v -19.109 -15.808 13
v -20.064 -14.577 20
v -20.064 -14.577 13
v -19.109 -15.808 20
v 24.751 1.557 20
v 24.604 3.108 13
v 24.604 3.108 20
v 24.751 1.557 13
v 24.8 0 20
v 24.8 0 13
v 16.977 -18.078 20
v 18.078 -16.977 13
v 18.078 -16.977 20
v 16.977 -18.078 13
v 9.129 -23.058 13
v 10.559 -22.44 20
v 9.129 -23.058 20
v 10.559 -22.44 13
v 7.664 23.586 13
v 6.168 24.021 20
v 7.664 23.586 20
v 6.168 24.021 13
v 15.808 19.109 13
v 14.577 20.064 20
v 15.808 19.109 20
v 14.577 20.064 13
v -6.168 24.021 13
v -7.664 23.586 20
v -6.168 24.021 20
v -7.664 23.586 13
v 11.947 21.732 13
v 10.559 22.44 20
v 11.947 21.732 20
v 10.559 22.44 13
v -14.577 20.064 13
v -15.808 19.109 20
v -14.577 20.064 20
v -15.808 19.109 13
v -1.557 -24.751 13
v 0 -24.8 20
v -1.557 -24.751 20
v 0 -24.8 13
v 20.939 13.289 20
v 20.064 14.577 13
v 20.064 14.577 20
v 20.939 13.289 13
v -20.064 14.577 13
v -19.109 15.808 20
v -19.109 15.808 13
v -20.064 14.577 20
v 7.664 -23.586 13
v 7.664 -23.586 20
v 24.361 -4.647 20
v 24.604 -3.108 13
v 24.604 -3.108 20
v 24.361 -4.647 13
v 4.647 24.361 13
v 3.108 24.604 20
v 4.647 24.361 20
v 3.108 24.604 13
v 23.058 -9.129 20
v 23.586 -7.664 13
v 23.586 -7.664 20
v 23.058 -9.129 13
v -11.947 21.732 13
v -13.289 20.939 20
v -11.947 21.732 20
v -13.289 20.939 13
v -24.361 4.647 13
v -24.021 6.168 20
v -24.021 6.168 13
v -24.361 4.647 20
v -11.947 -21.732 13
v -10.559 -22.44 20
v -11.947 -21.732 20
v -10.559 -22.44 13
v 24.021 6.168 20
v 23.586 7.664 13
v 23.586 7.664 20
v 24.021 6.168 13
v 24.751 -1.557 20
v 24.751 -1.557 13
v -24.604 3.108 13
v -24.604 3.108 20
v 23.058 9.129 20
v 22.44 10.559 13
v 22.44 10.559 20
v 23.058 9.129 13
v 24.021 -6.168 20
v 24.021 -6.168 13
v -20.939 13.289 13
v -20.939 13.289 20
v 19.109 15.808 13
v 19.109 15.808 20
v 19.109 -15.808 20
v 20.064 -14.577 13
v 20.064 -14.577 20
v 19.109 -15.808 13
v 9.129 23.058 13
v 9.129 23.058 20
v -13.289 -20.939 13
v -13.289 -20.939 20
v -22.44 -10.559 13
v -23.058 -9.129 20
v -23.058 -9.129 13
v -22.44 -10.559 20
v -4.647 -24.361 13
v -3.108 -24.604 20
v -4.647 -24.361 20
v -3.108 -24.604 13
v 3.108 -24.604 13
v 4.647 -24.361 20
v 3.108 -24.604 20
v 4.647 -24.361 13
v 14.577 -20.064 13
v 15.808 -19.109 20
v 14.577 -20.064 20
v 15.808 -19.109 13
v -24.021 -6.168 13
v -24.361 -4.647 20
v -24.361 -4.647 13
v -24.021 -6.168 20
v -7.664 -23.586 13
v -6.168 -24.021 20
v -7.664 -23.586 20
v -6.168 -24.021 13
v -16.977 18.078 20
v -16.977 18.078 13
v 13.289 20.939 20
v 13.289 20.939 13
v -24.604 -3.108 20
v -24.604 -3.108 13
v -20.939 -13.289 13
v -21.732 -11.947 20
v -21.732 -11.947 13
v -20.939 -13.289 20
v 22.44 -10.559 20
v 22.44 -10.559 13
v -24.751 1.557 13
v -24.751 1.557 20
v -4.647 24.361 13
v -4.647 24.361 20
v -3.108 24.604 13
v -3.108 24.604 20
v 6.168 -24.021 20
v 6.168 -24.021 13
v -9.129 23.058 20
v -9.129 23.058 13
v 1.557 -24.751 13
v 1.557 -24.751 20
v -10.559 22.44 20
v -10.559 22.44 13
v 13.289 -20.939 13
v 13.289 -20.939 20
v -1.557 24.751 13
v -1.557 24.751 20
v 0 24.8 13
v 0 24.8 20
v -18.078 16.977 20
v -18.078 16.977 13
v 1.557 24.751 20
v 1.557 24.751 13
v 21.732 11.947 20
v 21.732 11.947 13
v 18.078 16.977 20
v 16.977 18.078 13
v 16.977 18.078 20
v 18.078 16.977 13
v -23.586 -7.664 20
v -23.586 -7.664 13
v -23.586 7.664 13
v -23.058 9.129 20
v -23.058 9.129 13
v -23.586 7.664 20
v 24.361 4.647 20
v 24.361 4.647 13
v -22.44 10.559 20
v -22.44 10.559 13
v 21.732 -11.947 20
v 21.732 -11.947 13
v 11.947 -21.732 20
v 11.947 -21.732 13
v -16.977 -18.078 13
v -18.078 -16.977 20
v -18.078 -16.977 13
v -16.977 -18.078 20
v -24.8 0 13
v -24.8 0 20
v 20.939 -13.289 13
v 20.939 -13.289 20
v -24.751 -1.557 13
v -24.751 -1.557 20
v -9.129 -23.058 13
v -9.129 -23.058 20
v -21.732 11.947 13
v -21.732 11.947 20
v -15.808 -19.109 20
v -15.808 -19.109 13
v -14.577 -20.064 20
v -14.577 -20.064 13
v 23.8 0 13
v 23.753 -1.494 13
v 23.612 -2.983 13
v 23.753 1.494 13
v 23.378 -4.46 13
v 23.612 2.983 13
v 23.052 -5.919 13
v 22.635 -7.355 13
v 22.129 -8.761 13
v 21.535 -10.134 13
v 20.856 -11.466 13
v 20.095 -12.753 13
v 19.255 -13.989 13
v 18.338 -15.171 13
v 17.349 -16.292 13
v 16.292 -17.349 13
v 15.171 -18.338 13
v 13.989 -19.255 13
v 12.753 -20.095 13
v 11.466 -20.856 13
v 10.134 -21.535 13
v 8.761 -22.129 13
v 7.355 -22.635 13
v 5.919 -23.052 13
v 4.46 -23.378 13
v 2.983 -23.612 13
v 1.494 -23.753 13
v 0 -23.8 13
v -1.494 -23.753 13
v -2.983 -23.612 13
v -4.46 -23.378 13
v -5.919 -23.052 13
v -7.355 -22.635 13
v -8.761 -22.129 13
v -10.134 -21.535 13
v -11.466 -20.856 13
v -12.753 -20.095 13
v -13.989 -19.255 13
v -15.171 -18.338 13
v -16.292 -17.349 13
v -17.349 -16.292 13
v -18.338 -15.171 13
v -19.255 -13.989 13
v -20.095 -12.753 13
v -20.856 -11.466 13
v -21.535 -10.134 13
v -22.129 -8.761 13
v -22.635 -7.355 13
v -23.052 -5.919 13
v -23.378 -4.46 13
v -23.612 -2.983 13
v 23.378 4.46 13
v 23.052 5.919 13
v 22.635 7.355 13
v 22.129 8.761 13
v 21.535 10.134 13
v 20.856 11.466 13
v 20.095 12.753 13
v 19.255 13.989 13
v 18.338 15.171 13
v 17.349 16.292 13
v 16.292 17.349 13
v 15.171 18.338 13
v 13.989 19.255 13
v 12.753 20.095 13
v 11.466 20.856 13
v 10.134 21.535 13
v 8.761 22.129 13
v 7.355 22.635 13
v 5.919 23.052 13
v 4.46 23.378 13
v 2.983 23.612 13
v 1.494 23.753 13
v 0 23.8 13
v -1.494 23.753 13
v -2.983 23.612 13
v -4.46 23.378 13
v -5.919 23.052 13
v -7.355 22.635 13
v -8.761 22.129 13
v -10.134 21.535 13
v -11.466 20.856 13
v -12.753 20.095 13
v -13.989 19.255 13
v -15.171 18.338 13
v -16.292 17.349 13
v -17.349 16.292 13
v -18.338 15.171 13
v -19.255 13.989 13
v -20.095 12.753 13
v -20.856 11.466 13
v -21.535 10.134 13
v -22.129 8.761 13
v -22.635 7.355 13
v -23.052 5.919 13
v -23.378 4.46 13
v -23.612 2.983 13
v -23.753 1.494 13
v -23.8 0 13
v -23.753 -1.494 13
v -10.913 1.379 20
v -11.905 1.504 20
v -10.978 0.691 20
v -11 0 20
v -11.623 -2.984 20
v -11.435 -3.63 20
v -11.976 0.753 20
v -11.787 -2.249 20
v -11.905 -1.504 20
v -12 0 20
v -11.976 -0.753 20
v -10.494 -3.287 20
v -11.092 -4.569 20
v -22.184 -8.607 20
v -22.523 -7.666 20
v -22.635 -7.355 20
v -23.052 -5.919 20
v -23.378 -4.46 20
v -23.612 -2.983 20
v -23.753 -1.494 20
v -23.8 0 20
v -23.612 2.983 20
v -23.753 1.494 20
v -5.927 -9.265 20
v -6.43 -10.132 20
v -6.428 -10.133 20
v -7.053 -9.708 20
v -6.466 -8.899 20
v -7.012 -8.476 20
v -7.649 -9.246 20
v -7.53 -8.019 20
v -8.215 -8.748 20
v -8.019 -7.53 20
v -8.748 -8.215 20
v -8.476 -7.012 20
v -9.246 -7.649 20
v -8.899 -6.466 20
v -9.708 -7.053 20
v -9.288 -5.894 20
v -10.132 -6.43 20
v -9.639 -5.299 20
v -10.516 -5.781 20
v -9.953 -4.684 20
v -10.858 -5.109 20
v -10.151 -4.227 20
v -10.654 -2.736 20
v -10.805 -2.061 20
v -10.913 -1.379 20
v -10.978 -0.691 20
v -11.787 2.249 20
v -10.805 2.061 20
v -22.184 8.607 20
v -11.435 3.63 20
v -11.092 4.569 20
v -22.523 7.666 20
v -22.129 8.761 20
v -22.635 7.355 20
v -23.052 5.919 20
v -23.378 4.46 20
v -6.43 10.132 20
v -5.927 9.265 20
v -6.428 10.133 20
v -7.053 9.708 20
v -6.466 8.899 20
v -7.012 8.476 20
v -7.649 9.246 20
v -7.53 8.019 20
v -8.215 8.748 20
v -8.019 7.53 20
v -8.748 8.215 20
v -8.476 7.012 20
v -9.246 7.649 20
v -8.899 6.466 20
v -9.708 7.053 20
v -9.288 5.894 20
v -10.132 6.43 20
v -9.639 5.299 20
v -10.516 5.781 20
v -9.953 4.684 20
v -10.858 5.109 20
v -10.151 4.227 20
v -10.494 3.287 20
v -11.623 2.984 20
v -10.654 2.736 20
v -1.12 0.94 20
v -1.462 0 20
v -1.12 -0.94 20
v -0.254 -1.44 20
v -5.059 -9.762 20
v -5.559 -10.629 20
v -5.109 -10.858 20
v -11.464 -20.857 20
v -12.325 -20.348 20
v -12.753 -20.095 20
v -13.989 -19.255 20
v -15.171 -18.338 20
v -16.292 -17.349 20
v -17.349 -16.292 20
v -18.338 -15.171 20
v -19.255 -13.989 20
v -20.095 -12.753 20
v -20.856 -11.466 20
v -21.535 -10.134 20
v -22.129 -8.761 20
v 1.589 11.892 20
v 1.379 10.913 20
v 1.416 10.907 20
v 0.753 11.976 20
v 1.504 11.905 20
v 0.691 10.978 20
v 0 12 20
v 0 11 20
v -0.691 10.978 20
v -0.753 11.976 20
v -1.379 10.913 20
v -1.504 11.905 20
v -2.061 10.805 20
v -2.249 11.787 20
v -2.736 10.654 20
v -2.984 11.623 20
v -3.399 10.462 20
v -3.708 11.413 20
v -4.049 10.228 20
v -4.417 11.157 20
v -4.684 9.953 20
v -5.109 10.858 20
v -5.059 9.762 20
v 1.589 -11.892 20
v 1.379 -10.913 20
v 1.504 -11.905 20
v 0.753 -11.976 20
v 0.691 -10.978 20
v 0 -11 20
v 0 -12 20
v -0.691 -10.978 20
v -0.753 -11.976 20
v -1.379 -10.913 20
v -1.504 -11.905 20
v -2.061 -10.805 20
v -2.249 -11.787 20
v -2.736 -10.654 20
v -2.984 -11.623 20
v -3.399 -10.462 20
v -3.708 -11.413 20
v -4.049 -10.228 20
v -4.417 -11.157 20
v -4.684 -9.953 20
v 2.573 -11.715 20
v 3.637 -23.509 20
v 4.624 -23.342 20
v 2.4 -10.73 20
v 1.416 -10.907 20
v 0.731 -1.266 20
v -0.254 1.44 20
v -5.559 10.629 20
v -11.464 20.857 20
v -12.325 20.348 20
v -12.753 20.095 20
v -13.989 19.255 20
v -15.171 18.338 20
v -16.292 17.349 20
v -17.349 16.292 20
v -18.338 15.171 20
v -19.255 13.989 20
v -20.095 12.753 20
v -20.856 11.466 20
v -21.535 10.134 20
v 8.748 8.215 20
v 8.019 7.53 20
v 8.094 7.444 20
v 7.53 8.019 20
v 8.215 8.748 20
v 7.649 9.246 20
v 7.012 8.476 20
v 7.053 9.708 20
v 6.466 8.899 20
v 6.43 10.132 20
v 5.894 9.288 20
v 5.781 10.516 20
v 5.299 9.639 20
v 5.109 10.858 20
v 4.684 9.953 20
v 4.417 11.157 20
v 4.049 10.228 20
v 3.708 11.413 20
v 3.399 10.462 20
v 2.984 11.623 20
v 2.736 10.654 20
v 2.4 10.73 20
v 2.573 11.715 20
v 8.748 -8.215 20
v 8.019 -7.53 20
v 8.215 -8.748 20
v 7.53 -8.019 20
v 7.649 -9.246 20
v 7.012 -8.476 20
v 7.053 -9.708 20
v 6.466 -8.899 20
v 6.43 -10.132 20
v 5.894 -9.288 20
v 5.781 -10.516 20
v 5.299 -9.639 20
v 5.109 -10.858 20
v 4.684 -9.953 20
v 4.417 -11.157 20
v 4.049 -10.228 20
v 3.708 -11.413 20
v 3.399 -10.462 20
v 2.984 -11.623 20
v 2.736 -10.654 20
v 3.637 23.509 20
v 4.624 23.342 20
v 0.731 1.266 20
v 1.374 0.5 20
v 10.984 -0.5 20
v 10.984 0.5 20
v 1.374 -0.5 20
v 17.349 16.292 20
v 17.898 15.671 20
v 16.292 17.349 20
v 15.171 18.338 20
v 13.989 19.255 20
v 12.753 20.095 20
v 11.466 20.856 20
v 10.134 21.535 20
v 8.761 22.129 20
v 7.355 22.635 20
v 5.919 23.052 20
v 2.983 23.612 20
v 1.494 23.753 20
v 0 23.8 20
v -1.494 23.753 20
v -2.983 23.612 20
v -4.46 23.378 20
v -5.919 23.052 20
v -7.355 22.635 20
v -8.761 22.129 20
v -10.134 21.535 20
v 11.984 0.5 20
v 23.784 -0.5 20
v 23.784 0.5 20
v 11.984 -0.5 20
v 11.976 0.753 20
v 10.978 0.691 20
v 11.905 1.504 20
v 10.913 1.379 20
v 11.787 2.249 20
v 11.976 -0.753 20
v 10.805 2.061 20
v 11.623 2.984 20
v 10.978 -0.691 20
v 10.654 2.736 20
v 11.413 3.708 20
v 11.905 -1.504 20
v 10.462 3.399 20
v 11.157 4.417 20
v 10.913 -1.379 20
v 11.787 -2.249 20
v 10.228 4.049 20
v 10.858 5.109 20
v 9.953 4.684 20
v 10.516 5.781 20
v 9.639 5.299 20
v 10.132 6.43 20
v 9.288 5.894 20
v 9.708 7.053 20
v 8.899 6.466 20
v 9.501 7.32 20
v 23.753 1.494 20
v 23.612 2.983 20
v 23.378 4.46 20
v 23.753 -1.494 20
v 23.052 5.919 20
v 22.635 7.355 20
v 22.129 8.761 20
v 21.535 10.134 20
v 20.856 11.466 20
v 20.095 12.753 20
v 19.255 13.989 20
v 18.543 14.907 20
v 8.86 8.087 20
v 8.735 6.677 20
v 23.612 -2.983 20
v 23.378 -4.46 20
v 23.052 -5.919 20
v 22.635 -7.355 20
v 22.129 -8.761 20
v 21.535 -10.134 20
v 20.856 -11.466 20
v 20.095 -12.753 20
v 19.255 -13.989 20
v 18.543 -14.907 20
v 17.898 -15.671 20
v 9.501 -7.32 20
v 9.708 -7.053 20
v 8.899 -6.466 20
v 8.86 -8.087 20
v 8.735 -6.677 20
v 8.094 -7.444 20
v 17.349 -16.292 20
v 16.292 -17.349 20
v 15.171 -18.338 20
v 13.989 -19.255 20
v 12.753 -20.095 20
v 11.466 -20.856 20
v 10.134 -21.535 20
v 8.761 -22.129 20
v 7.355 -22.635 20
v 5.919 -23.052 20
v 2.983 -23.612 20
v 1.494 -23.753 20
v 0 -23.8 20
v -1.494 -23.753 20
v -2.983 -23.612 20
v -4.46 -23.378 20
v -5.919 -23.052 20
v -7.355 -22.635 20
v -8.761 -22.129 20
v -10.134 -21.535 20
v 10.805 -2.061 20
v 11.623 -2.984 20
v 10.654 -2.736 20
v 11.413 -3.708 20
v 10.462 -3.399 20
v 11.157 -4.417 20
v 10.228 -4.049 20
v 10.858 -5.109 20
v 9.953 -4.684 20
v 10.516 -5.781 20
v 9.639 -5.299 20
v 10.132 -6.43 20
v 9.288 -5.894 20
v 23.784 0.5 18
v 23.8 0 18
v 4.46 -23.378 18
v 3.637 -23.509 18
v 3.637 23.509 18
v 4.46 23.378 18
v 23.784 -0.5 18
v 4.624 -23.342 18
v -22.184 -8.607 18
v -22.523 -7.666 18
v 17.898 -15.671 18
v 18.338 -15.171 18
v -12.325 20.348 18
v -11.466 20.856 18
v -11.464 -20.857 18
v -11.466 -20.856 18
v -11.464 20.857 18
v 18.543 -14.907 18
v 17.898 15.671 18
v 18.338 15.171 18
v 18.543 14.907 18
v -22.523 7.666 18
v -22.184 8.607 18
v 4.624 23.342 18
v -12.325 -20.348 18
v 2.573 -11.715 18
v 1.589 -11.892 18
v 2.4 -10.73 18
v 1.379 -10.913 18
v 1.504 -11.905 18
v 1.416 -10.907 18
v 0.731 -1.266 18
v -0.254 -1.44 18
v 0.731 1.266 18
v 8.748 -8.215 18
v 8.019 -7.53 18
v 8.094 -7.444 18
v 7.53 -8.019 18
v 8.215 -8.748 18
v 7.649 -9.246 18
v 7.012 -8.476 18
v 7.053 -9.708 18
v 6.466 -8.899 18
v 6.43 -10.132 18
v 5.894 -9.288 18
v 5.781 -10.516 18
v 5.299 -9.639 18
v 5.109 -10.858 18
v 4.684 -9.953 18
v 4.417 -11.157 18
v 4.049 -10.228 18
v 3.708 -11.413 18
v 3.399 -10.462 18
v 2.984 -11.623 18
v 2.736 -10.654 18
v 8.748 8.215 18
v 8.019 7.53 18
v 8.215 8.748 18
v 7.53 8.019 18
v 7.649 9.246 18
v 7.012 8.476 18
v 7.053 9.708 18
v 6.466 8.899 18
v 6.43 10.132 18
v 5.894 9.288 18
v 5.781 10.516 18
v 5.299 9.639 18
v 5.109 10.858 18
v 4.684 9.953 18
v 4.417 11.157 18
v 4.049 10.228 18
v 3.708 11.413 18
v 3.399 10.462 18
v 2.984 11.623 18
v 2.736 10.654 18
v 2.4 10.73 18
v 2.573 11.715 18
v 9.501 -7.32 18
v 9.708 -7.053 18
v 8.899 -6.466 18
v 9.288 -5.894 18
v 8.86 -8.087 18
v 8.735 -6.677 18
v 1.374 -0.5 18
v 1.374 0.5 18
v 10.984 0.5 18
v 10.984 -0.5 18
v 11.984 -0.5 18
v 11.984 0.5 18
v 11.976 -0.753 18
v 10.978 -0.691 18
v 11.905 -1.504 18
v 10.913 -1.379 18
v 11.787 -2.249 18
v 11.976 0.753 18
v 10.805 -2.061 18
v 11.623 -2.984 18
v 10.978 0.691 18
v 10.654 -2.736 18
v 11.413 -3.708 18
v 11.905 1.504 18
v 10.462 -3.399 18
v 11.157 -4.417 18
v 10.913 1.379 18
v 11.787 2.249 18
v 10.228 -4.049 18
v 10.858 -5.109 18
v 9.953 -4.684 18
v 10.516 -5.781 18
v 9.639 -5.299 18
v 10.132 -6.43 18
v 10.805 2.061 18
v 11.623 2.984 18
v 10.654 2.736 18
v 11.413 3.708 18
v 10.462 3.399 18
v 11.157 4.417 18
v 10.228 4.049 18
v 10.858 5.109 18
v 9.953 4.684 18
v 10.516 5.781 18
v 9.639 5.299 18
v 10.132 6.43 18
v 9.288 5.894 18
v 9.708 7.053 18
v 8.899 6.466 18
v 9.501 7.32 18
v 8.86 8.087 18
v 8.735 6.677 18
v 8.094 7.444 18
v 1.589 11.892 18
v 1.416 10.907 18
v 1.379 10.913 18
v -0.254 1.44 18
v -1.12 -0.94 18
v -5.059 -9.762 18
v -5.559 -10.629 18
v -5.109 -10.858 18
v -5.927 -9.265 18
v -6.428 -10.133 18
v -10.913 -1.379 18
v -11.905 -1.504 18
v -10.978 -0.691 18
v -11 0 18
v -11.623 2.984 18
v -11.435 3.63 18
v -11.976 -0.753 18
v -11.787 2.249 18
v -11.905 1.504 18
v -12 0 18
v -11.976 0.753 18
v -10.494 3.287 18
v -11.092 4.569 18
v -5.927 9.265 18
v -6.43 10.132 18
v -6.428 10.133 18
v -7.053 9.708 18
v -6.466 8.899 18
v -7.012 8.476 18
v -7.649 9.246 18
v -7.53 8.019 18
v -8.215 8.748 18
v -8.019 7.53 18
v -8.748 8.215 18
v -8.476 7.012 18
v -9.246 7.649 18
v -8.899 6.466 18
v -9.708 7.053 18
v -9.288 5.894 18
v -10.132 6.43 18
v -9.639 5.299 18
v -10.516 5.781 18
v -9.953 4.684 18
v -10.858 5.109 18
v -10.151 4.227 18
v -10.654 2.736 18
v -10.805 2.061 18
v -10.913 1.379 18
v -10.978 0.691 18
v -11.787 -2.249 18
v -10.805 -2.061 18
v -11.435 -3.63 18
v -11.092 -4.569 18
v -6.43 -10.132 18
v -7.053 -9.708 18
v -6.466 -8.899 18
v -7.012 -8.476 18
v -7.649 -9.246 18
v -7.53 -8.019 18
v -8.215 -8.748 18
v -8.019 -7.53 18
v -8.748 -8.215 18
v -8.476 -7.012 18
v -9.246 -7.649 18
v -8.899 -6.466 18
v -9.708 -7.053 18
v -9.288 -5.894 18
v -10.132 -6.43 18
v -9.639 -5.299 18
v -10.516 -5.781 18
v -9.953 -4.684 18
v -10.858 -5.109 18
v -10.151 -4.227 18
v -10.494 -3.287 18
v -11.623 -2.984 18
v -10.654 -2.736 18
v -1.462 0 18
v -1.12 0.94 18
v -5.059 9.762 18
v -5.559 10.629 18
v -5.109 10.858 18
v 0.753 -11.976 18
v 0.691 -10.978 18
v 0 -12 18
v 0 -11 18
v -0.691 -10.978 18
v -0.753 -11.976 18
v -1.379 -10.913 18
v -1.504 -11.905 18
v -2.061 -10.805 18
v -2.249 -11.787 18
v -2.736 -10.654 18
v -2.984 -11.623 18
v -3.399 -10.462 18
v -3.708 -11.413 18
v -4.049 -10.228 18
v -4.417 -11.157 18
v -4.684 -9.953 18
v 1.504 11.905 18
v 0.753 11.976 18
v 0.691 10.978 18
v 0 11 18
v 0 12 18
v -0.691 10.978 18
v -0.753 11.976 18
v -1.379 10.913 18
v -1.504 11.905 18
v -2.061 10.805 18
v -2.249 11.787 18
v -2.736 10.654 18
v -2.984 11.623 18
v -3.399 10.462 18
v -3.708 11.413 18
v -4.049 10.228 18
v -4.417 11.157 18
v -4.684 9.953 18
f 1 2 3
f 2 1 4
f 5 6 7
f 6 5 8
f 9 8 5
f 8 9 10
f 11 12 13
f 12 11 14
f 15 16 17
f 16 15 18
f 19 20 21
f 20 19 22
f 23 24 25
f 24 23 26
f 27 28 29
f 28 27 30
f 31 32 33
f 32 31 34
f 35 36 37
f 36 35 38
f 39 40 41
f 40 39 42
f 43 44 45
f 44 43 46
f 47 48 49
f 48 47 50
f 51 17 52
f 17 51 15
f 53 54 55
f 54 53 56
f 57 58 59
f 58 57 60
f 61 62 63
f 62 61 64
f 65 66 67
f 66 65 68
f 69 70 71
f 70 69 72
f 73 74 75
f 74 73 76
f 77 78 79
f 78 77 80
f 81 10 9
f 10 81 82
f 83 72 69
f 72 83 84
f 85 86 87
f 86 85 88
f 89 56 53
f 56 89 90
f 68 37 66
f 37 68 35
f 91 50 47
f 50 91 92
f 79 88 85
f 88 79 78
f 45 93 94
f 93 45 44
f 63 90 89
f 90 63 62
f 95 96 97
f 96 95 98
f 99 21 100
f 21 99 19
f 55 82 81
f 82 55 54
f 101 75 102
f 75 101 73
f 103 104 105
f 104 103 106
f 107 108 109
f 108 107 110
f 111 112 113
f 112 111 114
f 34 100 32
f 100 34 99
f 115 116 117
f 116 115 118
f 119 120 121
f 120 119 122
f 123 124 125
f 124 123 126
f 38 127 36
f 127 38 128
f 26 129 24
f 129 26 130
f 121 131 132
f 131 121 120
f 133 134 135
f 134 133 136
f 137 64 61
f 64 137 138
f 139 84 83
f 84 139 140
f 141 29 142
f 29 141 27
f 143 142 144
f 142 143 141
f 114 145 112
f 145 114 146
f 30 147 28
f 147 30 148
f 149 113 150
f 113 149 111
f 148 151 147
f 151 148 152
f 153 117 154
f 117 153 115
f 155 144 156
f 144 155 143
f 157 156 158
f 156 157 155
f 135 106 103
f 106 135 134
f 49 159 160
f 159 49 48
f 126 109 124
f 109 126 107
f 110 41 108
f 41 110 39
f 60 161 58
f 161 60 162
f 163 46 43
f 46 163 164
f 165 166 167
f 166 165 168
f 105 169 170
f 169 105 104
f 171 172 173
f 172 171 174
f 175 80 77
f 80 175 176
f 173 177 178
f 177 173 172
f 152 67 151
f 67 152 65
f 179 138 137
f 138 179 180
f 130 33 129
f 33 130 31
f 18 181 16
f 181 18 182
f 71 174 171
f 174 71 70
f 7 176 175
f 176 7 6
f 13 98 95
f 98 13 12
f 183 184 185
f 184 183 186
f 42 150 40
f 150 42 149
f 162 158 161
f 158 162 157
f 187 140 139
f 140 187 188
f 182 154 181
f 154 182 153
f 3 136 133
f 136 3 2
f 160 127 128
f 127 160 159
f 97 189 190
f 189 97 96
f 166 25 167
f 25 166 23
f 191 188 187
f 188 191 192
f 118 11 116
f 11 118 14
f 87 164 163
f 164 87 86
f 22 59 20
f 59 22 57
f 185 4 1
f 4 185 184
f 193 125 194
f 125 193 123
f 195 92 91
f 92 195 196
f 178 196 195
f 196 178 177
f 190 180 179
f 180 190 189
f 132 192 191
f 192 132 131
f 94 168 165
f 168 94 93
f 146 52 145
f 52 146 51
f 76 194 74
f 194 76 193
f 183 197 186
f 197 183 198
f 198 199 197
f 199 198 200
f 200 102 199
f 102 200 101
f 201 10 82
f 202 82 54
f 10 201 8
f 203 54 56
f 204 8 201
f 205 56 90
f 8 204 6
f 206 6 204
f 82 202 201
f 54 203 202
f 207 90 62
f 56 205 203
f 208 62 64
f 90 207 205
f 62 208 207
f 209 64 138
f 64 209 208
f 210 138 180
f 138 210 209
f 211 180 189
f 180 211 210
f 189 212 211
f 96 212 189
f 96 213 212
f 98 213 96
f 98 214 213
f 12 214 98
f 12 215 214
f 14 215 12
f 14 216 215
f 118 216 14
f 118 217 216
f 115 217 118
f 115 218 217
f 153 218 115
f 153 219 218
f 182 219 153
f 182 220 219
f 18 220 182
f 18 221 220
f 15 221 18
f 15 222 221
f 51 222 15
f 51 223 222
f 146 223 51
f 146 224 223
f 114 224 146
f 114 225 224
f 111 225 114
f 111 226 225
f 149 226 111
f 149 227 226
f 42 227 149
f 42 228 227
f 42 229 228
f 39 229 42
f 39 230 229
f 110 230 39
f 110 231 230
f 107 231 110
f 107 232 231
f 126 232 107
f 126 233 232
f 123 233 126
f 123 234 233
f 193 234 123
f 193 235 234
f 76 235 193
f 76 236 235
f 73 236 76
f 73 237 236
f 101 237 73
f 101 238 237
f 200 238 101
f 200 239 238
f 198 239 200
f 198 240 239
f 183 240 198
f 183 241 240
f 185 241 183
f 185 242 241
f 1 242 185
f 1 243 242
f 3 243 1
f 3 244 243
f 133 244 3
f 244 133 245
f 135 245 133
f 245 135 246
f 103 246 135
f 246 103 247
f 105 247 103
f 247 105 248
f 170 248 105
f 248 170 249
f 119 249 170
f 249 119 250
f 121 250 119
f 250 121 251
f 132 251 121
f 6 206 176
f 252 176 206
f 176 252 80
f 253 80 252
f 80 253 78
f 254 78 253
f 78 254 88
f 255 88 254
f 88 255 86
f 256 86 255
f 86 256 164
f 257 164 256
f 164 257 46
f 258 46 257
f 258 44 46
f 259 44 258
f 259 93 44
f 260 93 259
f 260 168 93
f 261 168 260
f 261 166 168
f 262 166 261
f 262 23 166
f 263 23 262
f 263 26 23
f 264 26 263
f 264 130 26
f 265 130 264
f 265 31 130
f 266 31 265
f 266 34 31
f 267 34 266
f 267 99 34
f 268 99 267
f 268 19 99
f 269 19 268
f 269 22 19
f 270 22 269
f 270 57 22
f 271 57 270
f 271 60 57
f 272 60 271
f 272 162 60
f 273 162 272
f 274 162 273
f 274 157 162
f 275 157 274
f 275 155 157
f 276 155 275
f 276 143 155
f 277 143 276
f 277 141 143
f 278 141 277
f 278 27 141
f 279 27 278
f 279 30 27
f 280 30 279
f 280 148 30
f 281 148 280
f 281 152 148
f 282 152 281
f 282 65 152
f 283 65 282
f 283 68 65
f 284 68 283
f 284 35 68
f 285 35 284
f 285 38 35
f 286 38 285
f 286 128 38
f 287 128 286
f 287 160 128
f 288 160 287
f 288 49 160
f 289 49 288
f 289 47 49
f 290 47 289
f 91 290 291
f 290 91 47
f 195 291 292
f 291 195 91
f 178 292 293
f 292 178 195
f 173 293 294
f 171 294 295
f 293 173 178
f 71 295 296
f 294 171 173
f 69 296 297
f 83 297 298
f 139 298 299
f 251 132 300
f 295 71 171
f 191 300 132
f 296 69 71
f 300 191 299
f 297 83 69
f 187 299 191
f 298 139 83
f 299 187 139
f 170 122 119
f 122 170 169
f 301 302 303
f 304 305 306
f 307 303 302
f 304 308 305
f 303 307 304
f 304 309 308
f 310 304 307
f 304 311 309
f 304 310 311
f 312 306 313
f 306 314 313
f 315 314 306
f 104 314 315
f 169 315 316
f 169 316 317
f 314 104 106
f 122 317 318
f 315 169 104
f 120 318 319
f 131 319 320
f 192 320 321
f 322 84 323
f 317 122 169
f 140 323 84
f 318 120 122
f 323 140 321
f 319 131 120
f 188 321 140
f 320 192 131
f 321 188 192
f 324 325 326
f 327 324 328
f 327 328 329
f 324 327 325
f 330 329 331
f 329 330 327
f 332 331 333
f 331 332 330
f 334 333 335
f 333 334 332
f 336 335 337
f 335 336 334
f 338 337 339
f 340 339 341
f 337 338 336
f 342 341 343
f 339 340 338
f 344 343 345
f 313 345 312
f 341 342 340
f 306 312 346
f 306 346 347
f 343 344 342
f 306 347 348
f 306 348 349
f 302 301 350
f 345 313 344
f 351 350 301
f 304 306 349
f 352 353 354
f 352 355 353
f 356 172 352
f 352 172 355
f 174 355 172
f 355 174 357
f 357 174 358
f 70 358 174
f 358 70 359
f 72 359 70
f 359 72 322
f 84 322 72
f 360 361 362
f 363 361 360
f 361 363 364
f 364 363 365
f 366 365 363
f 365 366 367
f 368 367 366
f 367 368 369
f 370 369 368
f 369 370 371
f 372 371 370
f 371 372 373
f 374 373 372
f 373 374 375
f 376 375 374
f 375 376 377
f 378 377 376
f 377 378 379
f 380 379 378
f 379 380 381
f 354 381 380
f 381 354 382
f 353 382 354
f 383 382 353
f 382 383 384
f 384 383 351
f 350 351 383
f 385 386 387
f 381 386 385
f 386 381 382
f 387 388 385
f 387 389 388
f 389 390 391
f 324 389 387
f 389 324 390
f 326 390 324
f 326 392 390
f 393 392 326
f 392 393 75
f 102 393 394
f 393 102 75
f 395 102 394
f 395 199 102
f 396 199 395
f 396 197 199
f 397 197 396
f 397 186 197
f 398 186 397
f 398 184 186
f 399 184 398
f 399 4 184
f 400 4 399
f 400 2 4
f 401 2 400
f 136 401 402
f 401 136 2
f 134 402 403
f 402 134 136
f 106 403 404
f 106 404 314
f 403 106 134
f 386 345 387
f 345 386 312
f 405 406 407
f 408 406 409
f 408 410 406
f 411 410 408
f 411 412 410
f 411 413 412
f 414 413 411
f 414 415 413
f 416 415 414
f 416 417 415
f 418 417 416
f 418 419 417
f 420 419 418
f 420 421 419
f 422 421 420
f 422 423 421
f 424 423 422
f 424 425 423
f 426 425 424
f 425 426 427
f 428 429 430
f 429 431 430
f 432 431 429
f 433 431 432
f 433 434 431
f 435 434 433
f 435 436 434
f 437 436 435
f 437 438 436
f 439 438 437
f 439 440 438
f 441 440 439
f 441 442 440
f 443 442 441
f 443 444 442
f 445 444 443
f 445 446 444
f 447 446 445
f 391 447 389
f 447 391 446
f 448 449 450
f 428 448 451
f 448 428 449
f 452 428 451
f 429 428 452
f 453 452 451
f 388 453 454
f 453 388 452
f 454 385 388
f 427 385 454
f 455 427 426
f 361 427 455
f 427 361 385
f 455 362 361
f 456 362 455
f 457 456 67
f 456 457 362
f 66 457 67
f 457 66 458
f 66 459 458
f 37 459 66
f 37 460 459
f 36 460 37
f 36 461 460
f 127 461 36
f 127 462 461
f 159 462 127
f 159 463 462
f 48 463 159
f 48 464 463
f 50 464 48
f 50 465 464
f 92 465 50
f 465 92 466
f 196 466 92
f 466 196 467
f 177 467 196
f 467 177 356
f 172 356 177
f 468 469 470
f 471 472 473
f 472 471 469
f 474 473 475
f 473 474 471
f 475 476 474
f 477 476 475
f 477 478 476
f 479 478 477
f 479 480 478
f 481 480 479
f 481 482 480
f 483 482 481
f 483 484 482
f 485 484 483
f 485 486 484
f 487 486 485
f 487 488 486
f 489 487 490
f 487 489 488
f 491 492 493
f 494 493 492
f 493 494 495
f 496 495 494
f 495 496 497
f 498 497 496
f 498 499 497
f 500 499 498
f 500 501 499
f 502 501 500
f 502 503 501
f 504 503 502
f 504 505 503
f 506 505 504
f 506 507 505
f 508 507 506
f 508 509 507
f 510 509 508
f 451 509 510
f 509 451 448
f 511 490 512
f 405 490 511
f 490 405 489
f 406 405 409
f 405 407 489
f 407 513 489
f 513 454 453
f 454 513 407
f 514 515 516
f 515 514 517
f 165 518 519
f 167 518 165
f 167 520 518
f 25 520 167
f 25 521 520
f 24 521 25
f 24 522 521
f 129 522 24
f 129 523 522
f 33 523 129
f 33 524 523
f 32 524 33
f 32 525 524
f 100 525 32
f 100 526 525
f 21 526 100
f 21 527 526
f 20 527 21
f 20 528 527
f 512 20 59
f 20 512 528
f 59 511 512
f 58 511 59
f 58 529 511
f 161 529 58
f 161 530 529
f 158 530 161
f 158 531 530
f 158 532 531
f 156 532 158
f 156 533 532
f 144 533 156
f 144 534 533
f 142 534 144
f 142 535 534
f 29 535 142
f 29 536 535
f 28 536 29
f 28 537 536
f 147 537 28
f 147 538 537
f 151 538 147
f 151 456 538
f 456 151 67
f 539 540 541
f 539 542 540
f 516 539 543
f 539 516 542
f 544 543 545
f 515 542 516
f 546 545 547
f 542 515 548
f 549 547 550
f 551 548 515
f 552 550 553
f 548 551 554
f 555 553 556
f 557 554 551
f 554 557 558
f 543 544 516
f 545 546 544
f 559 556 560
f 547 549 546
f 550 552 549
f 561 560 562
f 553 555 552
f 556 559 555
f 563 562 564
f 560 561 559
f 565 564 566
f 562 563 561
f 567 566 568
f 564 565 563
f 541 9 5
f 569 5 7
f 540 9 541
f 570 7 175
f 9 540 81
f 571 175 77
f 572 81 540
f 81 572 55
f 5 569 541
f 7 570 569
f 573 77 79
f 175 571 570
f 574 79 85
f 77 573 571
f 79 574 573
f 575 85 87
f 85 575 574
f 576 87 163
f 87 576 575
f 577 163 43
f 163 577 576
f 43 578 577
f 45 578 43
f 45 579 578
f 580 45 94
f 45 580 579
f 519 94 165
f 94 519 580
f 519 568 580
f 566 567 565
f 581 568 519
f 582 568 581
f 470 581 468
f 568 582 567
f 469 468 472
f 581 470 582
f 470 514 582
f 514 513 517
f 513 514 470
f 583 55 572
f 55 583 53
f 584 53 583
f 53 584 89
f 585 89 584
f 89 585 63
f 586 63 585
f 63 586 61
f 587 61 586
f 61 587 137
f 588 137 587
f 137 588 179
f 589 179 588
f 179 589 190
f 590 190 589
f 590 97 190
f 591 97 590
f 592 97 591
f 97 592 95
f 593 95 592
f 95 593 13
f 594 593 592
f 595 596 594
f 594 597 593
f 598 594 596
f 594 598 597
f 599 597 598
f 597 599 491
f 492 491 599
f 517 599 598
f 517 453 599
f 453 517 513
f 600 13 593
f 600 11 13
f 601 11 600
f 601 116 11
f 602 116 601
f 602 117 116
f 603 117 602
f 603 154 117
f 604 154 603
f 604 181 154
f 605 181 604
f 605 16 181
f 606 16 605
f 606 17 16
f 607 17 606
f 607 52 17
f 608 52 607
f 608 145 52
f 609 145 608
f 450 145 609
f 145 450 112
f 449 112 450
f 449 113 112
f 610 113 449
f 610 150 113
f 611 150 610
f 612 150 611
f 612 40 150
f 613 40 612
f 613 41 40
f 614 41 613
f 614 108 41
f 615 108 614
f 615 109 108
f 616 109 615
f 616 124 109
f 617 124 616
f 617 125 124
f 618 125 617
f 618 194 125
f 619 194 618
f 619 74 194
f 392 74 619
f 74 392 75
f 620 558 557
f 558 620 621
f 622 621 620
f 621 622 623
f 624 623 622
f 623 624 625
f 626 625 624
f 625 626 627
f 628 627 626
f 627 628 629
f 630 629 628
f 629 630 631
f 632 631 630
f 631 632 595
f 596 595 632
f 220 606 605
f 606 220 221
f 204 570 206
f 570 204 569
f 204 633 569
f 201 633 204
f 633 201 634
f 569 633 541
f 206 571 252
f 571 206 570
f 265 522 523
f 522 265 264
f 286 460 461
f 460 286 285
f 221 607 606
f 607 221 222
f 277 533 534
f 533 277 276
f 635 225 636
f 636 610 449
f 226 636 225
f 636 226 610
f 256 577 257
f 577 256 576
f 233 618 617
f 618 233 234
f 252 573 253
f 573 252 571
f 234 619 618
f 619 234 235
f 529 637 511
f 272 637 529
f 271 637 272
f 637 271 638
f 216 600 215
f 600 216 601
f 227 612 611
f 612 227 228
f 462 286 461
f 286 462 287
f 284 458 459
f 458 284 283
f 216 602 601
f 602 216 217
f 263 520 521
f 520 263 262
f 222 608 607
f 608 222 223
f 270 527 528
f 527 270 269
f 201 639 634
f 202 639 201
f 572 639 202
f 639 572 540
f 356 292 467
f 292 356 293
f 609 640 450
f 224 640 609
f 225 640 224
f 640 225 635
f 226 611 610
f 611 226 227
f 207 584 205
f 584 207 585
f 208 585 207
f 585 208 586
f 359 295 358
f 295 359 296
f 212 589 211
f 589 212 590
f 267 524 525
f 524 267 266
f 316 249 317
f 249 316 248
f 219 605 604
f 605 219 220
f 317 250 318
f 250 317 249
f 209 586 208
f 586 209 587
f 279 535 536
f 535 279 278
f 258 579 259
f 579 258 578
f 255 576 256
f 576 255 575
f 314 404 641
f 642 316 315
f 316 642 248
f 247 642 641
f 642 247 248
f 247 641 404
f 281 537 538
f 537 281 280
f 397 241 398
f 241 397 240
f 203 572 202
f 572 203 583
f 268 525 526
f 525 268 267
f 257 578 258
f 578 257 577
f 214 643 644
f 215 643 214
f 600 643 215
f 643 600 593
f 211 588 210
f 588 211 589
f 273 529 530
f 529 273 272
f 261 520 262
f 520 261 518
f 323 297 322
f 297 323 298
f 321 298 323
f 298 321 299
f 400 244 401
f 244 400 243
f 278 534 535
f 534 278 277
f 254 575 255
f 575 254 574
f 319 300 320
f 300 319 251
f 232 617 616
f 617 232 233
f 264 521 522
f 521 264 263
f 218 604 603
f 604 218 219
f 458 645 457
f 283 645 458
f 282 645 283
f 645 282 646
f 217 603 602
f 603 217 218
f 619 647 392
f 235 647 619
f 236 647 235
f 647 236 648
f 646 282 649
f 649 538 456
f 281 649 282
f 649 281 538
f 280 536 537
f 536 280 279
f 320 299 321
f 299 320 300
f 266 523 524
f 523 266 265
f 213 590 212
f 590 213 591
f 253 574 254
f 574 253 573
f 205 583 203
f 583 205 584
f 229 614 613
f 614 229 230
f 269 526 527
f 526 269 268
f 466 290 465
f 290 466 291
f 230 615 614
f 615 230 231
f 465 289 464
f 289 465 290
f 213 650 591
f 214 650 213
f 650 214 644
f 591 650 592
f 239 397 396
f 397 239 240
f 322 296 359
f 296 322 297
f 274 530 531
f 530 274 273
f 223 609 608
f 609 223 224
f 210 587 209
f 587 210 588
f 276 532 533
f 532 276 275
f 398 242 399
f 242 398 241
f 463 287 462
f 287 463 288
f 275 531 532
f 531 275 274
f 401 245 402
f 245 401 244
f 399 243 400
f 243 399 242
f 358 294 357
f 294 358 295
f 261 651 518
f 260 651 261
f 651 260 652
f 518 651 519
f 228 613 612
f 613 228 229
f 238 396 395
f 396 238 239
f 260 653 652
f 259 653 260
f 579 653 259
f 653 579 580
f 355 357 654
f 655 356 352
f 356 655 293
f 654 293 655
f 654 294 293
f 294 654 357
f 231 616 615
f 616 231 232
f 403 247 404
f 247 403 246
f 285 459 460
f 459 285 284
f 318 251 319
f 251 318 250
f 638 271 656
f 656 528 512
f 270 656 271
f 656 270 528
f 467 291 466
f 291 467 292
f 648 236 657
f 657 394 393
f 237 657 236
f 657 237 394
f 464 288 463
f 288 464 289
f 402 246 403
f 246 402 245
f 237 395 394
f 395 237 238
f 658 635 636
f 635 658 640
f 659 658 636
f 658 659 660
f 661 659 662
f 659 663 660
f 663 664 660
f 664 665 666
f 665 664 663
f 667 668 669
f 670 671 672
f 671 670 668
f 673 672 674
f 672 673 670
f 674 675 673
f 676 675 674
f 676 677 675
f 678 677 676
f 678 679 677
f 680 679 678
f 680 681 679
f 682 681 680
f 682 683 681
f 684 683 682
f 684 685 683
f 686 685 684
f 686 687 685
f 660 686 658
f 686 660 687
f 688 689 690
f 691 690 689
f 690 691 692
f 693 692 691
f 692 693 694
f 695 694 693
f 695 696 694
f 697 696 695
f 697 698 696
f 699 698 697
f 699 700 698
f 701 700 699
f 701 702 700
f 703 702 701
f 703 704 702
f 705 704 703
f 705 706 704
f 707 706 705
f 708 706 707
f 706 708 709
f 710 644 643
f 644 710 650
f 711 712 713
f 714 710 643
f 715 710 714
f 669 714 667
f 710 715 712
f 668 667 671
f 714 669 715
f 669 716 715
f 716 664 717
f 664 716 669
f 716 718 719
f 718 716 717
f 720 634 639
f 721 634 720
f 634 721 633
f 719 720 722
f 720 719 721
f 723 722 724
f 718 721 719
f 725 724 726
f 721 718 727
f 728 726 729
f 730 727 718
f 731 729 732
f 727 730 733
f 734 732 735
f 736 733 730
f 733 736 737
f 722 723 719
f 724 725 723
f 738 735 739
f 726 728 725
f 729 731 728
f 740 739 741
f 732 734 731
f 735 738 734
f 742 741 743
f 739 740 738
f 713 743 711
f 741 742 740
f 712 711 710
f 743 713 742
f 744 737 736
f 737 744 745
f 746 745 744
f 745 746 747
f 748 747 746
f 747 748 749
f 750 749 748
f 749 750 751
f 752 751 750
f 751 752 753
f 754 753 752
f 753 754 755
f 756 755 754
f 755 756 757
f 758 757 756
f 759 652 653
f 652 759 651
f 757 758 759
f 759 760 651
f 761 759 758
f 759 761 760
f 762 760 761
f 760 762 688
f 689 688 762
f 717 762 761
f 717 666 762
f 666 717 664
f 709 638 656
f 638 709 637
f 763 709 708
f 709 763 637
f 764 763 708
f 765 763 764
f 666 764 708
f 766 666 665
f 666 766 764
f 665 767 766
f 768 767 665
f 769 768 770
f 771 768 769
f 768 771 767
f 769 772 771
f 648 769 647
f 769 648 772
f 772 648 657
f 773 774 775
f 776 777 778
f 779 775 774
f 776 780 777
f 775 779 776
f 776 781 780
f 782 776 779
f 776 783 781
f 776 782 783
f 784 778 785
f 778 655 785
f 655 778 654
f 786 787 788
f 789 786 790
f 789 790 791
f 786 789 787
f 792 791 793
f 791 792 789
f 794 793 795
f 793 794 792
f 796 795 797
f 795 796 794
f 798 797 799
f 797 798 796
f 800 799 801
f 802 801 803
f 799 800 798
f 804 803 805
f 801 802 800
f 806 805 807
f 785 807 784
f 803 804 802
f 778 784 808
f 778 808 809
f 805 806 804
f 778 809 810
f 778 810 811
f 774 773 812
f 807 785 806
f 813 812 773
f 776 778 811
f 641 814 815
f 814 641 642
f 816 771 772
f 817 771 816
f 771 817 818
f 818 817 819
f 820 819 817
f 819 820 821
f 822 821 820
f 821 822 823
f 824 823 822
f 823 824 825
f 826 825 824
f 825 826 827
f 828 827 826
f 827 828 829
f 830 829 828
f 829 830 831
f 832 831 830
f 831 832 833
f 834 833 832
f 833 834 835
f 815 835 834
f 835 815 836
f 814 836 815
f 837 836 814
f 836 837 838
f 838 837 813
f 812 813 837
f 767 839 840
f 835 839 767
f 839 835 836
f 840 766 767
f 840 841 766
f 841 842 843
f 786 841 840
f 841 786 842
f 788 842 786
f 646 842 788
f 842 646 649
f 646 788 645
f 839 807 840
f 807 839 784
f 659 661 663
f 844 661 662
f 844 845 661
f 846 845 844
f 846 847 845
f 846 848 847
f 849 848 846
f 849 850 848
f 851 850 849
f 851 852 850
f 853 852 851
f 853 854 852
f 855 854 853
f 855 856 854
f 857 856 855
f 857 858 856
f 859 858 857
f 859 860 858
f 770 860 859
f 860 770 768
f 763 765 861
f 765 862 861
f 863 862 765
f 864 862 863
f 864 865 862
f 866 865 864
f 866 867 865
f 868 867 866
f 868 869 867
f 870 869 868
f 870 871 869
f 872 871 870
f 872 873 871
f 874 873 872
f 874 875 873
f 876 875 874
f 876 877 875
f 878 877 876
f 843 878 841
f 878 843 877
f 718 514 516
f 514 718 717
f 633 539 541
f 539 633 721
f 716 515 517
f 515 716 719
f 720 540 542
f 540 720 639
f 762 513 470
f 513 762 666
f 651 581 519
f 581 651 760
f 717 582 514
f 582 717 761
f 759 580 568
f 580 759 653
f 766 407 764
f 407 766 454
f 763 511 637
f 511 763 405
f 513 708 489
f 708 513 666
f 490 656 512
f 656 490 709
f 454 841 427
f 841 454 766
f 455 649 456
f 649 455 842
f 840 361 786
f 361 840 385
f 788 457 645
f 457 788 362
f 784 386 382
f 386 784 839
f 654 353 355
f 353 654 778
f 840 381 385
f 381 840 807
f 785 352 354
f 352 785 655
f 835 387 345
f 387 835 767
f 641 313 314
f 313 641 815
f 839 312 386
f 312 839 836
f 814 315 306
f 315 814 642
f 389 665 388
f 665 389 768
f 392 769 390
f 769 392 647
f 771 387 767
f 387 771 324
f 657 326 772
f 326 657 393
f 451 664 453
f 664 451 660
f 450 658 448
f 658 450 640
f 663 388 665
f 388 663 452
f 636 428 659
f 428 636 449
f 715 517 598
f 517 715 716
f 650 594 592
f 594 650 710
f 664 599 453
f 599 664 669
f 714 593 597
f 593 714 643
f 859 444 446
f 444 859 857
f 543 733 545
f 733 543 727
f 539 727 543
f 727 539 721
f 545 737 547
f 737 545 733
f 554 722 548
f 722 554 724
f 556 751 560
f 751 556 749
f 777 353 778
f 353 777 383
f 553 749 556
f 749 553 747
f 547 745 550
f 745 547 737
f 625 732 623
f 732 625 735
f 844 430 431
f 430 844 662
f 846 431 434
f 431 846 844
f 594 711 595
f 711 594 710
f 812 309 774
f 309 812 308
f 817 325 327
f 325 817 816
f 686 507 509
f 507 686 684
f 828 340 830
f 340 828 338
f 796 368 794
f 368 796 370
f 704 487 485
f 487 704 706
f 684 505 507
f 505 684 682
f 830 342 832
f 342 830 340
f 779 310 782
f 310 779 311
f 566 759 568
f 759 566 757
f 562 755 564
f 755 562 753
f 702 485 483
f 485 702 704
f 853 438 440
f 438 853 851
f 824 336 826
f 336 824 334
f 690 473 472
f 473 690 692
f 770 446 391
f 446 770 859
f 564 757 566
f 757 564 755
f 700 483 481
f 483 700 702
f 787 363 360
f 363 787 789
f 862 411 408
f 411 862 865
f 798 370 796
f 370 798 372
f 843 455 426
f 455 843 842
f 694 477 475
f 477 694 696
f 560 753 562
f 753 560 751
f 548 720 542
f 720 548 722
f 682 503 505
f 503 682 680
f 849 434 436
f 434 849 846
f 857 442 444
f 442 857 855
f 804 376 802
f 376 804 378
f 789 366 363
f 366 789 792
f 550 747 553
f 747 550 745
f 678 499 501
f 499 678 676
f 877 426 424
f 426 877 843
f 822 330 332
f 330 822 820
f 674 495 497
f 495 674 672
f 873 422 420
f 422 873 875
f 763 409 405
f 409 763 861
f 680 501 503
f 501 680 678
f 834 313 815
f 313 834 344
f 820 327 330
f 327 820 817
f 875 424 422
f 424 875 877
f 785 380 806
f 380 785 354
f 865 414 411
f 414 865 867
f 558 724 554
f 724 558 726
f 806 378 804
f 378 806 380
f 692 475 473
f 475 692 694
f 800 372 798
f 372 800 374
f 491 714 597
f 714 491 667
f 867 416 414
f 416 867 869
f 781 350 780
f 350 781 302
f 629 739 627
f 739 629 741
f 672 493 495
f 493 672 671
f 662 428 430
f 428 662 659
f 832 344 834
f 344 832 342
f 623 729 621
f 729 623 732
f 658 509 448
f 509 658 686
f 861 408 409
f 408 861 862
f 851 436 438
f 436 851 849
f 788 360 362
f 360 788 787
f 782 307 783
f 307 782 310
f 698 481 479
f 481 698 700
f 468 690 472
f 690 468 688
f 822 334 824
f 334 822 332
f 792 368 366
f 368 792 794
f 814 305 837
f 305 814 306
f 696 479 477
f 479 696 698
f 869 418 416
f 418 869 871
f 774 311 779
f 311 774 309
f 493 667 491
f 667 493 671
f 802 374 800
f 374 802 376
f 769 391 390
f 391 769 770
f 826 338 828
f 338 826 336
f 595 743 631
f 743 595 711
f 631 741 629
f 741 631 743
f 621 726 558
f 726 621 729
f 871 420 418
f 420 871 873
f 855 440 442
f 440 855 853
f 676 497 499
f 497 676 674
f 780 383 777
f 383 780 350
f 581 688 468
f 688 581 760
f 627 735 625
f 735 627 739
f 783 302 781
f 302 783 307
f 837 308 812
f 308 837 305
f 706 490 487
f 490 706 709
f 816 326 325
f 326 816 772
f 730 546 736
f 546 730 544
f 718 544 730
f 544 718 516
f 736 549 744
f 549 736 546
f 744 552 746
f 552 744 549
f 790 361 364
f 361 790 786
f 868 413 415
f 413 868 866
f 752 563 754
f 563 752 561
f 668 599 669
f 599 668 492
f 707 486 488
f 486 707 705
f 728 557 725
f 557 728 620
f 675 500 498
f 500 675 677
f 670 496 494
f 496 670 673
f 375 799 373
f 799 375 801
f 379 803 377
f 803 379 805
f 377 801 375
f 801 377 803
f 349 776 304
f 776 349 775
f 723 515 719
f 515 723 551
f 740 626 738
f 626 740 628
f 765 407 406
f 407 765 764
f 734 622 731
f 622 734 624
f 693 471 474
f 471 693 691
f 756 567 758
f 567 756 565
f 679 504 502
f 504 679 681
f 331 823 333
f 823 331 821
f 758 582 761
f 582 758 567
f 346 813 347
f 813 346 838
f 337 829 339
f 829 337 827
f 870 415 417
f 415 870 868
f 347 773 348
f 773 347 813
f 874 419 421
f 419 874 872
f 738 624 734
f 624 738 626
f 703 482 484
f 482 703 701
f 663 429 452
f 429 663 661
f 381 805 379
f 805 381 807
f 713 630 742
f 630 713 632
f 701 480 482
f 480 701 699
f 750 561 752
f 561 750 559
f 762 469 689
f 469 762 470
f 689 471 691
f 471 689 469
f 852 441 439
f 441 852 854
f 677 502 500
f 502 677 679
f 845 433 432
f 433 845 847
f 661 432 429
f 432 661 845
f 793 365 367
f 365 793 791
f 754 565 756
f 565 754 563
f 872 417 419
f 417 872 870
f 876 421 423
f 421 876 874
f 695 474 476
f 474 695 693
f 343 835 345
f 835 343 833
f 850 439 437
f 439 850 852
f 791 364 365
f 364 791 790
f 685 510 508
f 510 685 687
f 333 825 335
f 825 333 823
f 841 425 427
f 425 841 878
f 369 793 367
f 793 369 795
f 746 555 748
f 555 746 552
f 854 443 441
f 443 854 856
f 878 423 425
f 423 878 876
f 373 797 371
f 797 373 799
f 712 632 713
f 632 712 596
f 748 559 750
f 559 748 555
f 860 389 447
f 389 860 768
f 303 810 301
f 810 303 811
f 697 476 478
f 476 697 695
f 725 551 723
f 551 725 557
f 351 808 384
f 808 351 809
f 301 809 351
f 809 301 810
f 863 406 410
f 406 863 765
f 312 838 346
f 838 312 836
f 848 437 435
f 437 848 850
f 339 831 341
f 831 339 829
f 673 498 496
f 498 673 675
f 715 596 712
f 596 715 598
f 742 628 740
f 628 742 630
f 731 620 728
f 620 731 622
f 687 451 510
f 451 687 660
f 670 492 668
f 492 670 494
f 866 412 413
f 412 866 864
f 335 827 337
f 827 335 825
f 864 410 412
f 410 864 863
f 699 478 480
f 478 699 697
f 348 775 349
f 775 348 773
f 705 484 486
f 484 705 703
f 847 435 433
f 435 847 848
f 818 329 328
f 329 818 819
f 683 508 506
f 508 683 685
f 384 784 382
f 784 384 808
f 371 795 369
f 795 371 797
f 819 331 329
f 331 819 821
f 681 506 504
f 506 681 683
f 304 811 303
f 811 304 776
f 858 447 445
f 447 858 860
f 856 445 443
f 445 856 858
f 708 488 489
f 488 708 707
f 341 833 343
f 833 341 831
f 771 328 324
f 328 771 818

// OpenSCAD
//
// ktKILLIFISH3
//

gap1 = 0.001;
gap2 = 0.002;
th = 2;

d1 = 7+1;
d2 = 12-1;
d3 = 2.1+0.4;
h1 = 9.6-2;
h2 = 2.1+0.4;
th1 = 5.1;
th2 = 2;
r1 = 20;
x1 = 16;

A = 1;
B = 0;

bx = 210;
bxh = 210/2;
by = 100;
bz = 60;

ar = 22/2;
ard = 1;
br = 50/2;
brd = 1;
cr = 37/2;
crd = 1;
dr = br-brd-0.2;
drd = 1;

A=0;
B=1;

//pole();

if(A)
{
difference()
{
    cylinder(h=10, r=ar+ard, $fn=100);
    translate([0, 0, -gap1]) cylinder(h=10+gap2, r=ar, $fn=100);
}

difference()
{
    cylinder(h=20, r=br+brd, $fn=100);
    translate([0, 0, -gap1]) cylinder(h=20+gap2, r=br, $fn=100);
}

for(i=[0:20:360])
{
    rotate([0, 0, i]) translate([ar, -1/2, 0]) cube([br-ar, 1, 2]);
}

difference()
{
    cylinder(h=2, r=cr+crd, $fn=100);
    translate([0, 0, -gap1]) cylinder(h=2+gap2, r=cr, $fn=100);
}

difference()
{
    for(i=[0:120:360])
    {
        rotate([0, 0, i]) translate([0, -2/2, 0]) cube([ar+ard+2, 2, 18]);
    }
    translate([0, 0, -90]) cylinder(h=100, r=22/2, $fn=100);
    translate([0, 0, -90-gap1]) cylinder(h=120+gap2, r=17/2, $fn=100);
}
}

if(B)
{
difference()
{
    translate([0, 0, 20-7]) cylinder(h=7, r=dr+drd, $fn=100);
    translate([0, 0, 20-7-gap1]) cylinder(h=7+gap2, r=dr, $fn=100);
}

for(i=[0:40:360])
{
    rotate([0, 0, i]) translate([0, -1/2, 18]) cube([dr, 1, 2]);
}

difference()
{
    translate([0, 0, 18]) cylinder(h=2, r=ar+ard, $fn=100);
    translate([0, 0, 18-gap1]) cylinder(h=2+gap2, r=ar, $fn=100);
}
}



module pole()
{
    difference()
    {
        color( "White" ) translate([0, 0, -90]) cylinder(h=100, r=22/2, $fn=100);
        translate([0, 0, -90-gap1]) cylinder(h=100+gap2, r=17/2, $fn=100);
    }
}
